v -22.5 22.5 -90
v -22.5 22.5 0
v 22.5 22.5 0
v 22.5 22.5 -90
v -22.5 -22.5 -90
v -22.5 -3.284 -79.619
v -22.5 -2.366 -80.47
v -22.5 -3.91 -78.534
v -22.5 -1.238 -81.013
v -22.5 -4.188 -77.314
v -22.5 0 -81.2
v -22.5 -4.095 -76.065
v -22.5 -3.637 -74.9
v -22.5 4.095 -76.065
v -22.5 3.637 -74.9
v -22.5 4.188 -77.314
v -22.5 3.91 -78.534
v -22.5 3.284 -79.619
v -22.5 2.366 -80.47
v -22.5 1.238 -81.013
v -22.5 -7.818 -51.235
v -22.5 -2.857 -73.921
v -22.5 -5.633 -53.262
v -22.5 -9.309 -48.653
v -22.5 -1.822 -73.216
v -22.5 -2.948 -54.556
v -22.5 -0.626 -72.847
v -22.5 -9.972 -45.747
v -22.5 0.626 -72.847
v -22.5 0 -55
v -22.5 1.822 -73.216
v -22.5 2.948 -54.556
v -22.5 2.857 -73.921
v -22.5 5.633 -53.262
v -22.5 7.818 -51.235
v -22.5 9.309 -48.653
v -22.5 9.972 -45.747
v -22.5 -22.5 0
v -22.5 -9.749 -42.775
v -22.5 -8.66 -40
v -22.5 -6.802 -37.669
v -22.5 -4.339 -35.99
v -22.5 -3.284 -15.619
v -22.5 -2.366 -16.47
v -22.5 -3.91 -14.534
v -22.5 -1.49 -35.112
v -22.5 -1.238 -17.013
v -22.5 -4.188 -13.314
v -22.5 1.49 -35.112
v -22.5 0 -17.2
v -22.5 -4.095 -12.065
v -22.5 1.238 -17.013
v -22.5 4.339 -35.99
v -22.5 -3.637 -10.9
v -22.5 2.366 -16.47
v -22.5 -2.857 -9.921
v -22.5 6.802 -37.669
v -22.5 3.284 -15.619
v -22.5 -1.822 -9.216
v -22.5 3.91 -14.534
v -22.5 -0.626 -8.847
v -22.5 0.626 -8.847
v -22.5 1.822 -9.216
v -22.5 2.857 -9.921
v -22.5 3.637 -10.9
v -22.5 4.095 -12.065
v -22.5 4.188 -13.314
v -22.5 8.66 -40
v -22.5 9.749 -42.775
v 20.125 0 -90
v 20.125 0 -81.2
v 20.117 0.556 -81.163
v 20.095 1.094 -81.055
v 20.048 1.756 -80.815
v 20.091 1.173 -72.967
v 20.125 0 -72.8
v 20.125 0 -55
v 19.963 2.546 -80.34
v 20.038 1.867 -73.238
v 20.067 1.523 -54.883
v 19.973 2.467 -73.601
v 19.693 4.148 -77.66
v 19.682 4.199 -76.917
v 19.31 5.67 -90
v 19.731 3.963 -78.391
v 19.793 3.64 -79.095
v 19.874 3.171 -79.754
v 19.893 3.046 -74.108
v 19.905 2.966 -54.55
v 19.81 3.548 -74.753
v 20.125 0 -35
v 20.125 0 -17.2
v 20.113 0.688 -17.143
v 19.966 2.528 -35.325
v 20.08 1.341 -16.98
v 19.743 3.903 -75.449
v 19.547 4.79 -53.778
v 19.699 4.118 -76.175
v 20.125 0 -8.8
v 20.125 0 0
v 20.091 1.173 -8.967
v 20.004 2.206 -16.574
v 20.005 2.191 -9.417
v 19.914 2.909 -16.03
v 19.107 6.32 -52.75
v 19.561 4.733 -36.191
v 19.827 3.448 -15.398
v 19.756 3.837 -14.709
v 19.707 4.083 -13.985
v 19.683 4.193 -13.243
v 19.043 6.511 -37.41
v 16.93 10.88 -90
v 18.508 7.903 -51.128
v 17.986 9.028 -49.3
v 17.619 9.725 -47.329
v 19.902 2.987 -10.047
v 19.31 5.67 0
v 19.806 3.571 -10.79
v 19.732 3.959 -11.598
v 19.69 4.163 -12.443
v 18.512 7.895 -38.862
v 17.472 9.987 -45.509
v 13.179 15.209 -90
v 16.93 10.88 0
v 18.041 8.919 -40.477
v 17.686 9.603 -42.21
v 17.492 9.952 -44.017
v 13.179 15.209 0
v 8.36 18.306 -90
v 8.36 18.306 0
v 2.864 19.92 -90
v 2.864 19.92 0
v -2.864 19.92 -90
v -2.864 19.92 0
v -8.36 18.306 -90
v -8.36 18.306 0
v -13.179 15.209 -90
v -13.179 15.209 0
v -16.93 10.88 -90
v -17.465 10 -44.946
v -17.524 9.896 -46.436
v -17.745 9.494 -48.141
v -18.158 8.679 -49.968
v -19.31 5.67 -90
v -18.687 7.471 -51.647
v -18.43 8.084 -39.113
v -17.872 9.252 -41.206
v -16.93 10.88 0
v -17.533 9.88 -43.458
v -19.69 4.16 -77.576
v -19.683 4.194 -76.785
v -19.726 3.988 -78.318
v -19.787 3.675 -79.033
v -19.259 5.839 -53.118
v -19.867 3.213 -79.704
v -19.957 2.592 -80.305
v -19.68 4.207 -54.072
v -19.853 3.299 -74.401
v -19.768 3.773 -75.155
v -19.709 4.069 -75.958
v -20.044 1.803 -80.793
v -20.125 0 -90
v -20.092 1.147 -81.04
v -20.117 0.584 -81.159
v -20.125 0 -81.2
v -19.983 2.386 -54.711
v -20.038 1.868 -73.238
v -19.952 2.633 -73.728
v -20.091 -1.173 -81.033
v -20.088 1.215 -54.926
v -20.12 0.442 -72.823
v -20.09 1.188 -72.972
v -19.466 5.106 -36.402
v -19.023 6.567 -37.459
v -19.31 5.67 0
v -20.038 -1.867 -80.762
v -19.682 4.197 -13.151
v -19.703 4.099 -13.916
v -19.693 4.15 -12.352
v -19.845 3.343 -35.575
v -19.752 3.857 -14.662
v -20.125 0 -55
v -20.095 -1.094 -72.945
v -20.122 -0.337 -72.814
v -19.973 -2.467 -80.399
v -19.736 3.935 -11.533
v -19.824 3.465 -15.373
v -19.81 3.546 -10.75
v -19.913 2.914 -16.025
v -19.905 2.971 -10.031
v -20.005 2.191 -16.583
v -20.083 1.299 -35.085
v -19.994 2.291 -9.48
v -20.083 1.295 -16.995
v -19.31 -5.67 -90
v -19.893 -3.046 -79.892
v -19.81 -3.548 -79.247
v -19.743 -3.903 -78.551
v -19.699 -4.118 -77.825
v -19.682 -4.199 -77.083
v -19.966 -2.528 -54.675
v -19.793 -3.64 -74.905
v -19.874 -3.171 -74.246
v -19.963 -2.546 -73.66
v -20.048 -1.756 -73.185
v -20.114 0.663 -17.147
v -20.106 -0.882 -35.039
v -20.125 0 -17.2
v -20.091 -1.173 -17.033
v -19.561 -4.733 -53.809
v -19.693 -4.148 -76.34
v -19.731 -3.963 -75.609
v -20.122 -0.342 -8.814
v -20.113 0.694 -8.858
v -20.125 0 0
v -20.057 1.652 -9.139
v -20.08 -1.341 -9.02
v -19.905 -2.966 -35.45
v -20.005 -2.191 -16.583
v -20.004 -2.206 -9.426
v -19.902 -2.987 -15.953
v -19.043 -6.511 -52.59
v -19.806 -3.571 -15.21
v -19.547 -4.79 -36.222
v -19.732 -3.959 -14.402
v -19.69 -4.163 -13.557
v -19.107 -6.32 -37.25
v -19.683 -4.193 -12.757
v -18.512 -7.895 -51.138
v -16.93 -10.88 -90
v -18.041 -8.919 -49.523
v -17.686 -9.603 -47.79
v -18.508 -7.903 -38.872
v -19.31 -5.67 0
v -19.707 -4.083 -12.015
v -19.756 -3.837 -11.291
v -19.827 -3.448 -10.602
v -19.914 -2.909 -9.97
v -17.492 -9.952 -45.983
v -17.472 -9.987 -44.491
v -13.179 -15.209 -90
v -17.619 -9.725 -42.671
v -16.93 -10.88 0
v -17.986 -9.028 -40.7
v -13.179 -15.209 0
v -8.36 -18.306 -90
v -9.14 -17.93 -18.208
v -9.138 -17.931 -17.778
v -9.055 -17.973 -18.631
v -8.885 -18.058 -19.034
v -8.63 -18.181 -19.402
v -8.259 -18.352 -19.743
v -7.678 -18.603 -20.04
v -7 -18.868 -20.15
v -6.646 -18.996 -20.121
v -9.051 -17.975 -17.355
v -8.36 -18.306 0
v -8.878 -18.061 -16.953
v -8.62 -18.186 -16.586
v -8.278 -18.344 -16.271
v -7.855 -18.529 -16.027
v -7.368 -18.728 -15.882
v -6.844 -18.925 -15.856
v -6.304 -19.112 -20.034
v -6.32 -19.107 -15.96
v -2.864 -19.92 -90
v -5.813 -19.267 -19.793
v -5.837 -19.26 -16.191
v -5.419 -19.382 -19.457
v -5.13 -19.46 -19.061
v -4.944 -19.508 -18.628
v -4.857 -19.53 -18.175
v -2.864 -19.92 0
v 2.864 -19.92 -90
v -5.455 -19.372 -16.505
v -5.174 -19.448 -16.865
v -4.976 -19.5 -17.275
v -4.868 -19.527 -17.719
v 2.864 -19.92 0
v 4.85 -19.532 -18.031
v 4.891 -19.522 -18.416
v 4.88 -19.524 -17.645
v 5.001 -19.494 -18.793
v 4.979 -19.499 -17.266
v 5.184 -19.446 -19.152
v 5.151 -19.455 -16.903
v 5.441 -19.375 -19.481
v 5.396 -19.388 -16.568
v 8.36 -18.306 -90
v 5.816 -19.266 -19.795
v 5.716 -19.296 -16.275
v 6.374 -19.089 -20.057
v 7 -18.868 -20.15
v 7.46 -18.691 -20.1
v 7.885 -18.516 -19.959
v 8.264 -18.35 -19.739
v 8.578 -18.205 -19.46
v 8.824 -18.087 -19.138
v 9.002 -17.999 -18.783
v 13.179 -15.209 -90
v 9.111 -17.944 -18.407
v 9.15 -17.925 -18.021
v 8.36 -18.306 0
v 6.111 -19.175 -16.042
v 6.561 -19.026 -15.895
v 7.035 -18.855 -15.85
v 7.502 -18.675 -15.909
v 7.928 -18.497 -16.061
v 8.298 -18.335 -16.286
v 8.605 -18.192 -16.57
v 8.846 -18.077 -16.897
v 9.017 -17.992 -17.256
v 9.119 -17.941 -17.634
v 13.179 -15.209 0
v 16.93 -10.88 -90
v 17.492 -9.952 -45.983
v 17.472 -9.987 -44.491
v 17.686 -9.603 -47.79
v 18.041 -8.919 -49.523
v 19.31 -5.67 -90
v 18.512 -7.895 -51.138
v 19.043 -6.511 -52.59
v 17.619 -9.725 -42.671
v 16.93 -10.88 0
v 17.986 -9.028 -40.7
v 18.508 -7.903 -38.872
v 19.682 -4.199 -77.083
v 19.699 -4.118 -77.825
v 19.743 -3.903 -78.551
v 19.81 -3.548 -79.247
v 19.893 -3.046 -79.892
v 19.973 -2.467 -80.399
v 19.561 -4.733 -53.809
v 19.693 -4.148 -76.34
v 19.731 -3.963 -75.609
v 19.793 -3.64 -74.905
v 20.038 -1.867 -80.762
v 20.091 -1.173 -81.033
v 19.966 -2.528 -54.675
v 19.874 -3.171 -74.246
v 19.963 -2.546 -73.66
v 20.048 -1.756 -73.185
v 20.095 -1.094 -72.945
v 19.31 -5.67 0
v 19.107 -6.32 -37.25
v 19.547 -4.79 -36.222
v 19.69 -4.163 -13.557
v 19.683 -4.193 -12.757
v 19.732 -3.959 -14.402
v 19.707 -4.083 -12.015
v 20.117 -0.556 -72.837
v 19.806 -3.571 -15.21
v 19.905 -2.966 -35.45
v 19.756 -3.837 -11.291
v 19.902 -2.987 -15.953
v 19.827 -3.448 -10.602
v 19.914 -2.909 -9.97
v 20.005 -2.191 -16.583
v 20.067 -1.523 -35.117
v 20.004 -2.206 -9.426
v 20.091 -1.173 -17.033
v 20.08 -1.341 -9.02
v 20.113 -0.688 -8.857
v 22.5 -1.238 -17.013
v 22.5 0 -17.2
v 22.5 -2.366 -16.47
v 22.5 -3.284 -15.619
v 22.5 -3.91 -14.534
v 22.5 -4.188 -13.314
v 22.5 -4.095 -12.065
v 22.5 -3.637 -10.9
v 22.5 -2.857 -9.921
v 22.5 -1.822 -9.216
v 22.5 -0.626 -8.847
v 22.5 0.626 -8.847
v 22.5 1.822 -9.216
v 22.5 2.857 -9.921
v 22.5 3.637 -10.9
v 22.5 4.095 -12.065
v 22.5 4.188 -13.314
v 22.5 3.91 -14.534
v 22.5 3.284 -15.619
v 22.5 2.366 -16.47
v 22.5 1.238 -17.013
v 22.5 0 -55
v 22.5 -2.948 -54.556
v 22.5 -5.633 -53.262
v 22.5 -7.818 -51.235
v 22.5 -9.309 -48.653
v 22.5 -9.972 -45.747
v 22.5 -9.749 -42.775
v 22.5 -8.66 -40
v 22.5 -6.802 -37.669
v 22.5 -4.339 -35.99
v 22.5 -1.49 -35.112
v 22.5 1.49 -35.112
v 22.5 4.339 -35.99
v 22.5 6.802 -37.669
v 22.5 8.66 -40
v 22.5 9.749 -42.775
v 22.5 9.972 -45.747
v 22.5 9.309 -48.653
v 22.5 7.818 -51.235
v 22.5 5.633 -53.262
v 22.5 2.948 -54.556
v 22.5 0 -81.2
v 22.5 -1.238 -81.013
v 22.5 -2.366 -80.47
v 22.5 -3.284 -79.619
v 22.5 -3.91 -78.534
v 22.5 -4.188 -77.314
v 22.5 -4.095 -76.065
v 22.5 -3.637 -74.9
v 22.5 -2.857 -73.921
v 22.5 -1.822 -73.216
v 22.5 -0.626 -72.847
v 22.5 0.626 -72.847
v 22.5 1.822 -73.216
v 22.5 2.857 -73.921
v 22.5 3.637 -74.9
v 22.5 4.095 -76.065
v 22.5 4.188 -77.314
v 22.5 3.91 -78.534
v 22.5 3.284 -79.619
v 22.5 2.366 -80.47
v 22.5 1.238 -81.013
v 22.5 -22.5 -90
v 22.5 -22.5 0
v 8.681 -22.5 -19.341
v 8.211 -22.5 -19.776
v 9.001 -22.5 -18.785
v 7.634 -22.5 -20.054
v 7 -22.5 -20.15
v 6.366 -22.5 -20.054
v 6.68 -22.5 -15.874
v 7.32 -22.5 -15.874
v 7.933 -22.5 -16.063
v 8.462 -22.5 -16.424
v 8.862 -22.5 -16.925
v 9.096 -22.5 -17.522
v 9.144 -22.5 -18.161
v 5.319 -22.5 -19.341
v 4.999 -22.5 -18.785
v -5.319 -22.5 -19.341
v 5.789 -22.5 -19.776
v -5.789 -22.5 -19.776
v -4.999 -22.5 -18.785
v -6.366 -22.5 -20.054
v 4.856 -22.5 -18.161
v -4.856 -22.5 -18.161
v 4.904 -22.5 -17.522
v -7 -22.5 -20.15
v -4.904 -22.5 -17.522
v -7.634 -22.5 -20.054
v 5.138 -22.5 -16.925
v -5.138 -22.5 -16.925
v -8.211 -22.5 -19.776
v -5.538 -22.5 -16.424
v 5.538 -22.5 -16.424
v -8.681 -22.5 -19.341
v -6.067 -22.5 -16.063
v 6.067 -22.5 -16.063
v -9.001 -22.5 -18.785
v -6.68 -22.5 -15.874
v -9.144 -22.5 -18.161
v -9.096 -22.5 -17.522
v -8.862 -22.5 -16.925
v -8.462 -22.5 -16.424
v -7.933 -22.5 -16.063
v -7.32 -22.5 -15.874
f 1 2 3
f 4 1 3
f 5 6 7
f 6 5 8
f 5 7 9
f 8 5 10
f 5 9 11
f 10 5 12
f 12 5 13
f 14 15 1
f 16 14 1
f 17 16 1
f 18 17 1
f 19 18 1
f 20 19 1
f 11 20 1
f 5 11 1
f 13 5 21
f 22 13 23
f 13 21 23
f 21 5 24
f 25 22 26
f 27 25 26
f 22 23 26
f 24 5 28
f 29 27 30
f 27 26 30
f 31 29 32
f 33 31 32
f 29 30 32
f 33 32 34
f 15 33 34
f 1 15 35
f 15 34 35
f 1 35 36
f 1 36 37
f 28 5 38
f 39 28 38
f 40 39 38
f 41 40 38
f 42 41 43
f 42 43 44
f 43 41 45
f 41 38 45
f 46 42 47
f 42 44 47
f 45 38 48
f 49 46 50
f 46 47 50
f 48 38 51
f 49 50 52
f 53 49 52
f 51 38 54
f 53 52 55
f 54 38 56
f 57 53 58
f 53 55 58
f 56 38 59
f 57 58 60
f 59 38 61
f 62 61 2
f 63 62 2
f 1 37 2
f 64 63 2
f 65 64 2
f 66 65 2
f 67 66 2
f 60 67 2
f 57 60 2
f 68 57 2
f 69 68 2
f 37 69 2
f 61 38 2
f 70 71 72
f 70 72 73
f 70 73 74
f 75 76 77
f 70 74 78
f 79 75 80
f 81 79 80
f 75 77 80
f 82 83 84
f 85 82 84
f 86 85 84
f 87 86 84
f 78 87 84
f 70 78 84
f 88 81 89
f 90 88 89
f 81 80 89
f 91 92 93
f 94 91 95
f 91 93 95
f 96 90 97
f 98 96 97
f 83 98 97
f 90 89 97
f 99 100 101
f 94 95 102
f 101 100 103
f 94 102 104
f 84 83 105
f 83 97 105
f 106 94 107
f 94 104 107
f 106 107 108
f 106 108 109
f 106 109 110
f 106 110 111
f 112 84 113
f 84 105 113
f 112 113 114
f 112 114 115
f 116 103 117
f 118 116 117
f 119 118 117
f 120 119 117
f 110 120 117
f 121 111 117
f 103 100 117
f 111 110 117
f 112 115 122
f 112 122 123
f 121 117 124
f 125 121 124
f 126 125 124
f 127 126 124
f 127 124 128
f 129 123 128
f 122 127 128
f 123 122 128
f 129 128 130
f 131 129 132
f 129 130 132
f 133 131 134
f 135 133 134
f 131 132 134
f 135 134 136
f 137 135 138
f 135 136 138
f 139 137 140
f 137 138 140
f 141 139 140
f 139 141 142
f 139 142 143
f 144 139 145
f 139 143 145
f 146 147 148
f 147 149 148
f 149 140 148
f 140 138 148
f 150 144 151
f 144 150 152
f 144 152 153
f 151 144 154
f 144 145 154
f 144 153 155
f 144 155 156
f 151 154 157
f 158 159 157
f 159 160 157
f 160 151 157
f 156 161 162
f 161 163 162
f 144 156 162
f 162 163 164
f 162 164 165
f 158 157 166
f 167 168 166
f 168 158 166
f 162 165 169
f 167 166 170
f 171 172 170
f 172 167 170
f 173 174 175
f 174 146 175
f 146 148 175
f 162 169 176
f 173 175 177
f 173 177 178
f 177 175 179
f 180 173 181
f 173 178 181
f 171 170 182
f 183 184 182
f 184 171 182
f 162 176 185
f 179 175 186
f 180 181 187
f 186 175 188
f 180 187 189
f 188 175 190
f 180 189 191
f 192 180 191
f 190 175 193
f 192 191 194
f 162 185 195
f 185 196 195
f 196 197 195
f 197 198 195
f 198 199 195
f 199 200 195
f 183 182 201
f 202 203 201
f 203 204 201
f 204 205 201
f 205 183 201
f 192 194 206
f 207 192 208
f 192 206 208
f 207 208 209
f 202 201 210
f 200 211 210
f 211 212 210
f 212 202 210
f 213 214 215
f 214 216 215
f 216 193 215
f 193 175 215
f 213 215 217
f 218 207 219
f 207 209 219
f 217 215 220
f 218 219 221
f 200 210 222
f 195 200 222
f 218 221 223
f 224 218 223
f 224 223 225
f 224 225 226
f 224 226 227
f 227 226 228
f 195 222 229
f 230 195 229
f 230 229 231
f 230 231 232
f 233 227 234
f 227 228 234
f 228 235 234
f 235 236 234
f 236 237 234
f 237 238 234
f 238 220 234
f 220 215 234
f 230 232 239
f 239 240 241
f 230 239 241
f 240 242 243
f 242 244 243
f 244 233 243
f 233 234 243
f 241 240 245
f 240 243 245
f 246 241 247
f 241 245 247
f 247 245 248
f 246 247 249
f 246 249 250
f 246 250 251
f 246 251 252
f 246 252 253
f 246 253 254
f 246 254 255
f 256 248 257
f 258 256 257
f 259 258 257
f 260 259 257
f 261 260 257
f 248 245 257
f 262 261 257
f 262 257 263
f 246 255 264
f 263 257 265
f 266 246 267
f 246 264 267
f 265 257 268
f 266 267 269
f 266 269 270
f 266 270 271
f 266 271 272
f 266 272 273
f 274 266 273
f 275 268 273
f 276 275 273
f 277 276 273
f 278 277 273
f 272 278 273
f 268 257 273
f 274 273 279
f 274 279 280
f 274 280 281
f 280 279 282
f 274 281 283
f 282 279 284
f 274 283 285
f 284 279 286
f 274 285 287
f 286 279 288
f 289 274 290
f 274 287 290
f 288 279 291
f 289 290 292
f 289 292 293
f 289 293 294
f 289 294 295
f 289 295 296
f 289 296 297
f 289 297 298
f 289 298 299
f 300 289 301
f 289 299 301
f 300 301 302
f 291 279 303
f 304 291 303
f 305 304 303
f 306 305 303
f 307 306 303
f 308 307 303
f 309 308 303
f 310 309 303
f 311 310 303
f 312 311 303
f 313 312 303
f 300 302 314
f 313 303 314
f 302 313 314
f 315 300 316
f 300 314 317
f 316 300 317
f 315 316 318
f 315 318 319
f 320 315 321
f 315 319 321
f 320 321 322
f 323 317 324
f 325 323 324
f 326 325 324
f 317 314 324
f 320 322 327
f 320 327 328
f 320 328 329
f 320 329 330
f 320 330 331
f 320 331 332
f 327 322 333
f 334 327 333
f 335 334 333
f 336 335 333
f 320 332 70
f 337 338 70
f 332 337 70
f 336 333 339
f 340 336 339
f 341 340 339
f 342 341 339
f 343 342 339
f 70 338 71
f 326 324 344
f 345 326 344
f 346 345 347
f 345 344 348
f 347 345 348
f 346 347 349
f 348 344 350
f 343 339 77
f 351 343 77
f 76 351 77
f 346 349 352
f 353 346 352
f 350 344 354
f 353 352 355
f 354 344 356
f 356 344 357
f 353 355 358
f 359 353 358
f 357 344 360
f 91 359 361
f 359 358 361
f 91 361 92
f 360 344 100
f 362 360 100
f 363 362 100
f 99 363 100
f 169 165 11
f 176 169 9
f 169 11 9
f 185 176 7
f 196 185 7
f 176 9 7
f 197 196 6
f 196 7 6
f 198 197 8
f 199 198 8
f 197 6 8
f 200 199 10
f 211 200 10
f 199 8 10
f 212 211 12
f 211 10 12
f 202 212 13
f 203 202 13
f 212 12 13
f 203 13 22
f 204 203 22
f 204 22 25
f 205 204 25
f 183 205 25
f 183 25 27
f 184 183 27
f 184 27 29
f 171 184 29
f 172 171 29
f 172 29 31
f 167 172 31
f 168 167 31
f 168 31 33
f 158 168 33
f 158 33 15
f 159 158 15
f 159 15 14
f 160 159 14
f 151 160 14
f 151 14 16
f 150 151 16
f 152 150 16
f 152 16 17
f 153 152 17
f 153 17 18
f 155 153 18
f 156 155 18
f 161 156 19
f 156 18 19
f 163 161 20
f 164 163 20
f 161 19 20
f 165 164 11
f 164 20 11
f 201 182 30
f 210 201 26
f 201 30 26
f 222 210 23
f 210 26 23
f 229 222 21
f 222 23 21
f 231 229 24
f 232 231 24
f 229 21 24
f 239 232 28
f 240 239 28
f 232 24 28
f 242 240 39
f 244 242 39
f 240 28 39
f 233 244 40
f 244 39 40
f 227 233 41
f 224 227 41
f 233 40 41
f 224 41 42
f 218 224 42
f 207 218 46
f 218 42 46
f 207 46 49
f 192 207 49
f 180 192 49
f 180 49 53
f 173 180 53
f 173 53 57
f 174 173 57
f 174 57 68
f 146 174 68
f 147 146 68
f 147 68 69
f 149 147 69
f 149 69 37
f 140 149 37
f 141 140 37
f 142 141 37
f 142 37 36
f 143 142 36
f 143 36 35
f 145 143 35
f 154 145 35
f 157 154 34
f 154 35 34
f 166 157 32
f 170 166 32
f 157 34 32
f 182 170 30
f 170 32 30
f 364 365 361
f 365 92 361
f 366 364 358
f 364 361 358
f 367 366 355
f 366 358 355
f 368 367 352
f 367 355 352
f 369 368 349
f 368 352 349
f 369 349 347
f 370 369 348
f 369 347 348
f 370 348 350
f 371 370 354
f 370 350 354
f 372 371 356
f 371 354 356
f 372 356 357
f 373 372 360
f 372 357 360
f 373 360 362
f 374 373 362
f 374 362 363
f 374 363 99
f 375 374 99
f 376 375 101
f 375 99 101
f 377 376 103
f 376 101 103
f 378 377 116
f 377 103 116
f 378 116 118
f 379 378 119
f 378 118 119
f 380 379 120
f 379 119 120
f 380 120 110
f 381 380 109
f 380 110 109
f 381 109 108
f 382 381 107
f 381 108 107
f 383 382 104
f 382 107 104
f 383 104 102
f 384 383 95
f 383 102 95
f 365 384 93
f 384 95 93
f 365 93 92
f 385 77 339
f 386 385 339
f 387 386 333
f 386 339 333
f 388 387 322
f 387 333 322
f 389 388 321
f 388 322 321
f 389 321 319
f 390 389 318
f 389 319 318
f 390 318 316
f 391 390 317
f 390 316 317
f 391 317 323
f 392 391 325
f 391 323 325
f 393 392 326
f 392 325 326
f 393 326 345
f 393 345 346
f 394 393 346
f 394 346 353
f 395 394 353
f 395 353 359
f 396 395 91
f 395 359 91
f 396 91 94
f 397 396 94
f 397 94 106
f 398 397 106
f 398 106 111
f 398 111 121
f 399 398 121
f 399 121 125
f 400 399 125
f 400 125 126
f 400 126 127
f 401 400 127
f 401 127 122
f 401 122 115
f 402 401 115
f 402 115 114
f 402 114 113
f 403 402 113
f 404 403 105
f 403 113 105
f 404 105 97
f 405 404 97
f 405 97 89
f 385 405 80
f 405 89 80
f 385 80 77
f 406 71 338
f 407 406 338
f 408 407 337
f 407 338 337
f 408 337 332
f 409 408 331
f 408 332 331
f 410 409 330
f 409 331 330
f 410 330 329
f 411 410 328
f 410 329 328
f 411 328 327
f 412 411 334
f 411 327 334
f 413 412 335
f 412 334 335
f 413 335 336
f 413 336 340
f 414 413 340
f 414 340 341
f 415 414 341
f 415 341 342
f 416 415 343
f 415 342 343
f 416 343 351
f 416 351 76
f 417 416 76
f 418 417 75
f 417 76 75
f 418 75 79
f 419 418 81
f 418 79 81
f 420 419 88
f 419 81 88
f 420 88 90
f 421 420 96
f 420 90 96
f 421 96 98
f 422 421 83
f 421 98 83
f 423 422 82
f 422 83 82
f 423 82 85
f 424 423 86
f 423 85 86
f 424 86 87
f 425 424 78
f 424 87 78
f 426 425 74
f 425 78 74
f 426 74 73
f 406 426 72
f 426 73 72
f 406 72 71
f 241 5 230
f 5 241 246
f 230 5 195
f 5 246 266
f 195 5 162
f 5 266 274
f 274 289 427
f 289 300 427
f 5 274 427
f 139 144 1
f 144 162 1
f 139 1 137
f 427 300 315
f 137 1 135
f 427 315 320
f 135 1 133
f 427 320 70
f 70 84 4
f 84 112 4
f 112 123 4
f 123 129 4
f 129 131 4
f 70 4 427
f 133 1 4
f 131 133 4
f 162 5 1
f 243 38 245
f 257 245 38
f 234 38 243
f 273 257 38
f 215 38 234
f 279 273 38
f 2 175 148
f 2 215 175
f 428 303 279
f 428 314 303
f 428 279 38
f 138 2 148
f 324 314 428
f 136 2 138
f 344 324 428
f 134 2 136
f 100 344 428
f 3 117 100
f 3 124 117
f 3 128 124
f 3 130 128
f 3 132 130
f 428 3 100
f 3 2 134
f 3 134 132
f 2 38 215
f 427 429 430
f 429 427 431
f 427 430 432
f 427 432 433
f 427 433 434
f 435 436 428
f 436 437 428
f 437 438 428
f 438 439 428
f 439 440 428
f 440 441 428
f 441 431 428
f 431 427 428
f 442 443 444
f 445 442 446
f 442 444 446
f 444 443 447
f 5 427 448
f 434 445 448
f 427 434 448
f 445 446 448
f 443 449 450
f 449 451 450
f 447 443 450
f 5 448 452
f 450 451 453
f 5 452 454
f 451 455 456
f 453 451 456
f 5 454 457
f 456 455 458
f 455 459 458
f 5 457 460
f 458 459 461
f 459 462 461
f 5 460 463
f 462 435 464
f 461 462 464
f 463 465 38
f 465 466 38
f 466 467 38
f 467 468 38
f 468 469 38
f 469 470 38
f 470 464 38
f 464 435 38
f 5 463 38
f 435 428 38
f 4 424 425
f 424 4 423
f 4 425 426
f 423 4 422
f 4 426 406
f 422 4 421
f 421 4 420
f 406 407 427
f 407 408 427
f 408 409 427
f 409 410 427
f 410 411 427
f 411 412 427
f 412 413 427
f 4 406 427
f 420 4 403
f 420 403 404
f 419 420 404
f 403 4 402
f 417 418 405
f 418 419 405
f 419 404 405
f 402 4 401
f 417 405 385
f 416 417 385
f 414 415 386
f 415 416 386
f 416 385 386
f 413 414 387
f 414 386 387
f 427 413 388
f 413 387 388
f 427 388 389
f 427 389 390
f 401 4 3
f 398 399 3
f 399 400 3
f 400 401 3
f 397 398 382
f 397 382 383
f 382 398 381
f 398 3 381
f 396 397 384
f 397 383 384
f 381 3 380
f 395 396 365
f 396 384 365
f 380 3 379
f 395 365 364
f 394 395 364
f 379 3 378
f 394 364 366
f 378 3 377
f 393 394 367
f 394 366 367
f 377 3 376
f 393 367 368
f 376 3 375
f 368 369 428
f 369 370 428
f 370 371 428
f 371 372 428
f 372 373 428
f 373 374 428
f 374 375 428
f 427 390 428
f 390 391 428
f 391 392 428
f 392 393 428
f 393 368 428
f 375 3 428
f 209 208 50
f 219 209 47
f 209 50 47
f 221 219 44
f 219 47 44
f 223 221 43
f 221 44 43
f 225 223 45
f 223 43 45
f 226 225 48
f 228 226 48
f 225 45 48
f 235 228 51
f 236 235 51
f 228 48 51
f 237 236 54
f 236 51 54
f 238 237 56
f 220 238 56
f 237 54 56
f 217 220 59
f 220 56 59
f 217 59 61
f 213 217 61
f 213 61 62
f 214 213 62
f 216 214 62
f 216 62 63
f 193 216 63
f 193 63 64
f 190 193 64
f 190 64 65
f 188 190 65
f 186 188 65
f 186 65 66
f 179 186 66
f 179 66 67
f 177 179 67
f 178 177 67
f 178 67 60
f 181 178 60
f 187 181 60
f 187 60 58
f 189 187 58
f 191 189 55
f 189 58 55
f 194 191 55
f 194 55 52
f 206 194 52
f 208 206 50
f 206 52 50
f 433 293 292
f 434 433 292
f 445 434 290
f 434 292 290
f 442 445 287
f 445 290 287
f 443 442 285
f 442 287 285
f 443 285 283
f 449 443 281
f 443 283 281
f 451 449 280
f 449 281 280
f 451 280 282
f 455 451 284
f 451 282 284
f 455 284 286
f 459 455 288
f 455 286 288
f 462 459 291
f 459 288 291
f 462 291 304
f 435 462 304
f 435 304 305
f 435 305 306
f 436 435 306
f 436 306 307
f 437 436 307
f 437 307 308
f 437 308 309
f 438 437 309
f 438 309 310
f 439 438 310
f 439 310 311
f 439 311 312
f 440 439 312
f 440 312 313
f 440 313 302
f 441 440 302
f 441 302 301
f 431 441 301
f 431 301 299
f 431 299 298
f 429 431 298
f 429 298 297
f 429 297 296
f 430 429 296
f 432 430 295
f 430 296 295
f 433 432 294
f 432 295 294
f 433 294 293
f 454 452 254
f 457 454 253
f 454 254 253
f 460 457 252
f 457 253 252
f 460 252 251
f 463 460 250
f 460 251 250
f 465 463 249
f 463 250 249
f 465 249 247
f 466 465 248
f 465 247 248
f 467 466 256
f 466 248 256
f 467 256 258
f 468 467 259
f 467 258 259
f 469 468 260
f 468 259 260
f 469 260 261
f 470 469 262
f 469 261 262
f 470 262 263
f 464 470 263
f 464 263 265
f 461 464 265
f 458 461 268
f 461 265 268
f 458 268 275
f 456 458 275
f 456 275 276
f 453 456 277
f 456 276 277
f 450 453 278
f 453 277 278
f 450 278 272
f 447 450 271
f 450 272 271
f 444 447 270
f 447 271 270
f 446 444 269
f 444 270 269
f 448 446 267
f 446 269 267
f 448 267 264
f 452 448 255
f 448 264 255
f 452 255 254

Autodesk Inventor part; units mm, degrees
ref_plane "YZ Plane" through (0, 0, 0) normal (1, 0, 0) x (0, 1, 0)
ref_plane "XZ Plane" through (0, 0, 0) normal (0, 1, 0) x (-1, 0, 0)
ref_plane "XY Plane" through (0, 0, 0) normal (0, 0, 1) x (1, 0, 0)
sketch "Sketch1" plane through (0, 0, 0) normal (0, 0, 1) x (1, 0, 0)
  line L0 (-22.5, 22.5) -> (22.5, 22.5)
  line L1 (22.5, 22.5) -> (22.5, -22.5)
  line L2 (22.5, -22.5) -> (-22.5, -22.5)
  line L3 (-22.5, -22.5) -> (-22.5, 22.5)
  line L4 (-22.5, 22.5) -> (22.5, -22.5) construction
  line L5 (22.5, 22.5) -> (-22.5, -22.5) construction
  circle A0 centre (0, 0) radius 20.125
  dimension "d0" = 45
  dimension "d1" = 45
  dimension "d2" = 40.25
extrude "Extrusion1" add sketch "Sketch1" against normal blind 90
sketch "Sketch2" plane through (22.5, -22.5, 0) normal (1, 0, 0) x (0, 0, -1)
  line L0 (0, 22.5) -> (13, 22.5)
  line L1 (13, 22.5) -> (77, 22.5)
  dimension "d5" = 13
  dimension "d6" = 64
hole "Hole1" at (22.5, 0, -13) at (22.5, 0, -77) direction (-1, 0, 0) diameter 8.4 end through all
sketch "Sketch3" plane through (22.5, -22.5, 0) normal (1, 0, 0) x (0, 0, -1)
  line L0 (0, 22.5) -> (45, 22.5)
  dimension "d14" = 45
hole "Hole2" at (22.5, 0, -45) direction (-1, 0, 0) diameter 20 end through all
sketch "Sketch4" plane through (-22.5, -22.5, 0) normal (0, -1, 0) x (1, 0, 0)
  line L0 (22.5, 0) -> (22.5, -18)
  line L1 (15.5, -18) -> (29.5, -18)
  dimension "d22" = 18
  dimension "d30" = 14
hole "Hole3" at (-7, -22.5, -18) at (7, -22.5, -18) direction (0, 1, 0) diameter 4.3 depth 8 tip angle 118
properties part number "Bohrschablone_Unten"
